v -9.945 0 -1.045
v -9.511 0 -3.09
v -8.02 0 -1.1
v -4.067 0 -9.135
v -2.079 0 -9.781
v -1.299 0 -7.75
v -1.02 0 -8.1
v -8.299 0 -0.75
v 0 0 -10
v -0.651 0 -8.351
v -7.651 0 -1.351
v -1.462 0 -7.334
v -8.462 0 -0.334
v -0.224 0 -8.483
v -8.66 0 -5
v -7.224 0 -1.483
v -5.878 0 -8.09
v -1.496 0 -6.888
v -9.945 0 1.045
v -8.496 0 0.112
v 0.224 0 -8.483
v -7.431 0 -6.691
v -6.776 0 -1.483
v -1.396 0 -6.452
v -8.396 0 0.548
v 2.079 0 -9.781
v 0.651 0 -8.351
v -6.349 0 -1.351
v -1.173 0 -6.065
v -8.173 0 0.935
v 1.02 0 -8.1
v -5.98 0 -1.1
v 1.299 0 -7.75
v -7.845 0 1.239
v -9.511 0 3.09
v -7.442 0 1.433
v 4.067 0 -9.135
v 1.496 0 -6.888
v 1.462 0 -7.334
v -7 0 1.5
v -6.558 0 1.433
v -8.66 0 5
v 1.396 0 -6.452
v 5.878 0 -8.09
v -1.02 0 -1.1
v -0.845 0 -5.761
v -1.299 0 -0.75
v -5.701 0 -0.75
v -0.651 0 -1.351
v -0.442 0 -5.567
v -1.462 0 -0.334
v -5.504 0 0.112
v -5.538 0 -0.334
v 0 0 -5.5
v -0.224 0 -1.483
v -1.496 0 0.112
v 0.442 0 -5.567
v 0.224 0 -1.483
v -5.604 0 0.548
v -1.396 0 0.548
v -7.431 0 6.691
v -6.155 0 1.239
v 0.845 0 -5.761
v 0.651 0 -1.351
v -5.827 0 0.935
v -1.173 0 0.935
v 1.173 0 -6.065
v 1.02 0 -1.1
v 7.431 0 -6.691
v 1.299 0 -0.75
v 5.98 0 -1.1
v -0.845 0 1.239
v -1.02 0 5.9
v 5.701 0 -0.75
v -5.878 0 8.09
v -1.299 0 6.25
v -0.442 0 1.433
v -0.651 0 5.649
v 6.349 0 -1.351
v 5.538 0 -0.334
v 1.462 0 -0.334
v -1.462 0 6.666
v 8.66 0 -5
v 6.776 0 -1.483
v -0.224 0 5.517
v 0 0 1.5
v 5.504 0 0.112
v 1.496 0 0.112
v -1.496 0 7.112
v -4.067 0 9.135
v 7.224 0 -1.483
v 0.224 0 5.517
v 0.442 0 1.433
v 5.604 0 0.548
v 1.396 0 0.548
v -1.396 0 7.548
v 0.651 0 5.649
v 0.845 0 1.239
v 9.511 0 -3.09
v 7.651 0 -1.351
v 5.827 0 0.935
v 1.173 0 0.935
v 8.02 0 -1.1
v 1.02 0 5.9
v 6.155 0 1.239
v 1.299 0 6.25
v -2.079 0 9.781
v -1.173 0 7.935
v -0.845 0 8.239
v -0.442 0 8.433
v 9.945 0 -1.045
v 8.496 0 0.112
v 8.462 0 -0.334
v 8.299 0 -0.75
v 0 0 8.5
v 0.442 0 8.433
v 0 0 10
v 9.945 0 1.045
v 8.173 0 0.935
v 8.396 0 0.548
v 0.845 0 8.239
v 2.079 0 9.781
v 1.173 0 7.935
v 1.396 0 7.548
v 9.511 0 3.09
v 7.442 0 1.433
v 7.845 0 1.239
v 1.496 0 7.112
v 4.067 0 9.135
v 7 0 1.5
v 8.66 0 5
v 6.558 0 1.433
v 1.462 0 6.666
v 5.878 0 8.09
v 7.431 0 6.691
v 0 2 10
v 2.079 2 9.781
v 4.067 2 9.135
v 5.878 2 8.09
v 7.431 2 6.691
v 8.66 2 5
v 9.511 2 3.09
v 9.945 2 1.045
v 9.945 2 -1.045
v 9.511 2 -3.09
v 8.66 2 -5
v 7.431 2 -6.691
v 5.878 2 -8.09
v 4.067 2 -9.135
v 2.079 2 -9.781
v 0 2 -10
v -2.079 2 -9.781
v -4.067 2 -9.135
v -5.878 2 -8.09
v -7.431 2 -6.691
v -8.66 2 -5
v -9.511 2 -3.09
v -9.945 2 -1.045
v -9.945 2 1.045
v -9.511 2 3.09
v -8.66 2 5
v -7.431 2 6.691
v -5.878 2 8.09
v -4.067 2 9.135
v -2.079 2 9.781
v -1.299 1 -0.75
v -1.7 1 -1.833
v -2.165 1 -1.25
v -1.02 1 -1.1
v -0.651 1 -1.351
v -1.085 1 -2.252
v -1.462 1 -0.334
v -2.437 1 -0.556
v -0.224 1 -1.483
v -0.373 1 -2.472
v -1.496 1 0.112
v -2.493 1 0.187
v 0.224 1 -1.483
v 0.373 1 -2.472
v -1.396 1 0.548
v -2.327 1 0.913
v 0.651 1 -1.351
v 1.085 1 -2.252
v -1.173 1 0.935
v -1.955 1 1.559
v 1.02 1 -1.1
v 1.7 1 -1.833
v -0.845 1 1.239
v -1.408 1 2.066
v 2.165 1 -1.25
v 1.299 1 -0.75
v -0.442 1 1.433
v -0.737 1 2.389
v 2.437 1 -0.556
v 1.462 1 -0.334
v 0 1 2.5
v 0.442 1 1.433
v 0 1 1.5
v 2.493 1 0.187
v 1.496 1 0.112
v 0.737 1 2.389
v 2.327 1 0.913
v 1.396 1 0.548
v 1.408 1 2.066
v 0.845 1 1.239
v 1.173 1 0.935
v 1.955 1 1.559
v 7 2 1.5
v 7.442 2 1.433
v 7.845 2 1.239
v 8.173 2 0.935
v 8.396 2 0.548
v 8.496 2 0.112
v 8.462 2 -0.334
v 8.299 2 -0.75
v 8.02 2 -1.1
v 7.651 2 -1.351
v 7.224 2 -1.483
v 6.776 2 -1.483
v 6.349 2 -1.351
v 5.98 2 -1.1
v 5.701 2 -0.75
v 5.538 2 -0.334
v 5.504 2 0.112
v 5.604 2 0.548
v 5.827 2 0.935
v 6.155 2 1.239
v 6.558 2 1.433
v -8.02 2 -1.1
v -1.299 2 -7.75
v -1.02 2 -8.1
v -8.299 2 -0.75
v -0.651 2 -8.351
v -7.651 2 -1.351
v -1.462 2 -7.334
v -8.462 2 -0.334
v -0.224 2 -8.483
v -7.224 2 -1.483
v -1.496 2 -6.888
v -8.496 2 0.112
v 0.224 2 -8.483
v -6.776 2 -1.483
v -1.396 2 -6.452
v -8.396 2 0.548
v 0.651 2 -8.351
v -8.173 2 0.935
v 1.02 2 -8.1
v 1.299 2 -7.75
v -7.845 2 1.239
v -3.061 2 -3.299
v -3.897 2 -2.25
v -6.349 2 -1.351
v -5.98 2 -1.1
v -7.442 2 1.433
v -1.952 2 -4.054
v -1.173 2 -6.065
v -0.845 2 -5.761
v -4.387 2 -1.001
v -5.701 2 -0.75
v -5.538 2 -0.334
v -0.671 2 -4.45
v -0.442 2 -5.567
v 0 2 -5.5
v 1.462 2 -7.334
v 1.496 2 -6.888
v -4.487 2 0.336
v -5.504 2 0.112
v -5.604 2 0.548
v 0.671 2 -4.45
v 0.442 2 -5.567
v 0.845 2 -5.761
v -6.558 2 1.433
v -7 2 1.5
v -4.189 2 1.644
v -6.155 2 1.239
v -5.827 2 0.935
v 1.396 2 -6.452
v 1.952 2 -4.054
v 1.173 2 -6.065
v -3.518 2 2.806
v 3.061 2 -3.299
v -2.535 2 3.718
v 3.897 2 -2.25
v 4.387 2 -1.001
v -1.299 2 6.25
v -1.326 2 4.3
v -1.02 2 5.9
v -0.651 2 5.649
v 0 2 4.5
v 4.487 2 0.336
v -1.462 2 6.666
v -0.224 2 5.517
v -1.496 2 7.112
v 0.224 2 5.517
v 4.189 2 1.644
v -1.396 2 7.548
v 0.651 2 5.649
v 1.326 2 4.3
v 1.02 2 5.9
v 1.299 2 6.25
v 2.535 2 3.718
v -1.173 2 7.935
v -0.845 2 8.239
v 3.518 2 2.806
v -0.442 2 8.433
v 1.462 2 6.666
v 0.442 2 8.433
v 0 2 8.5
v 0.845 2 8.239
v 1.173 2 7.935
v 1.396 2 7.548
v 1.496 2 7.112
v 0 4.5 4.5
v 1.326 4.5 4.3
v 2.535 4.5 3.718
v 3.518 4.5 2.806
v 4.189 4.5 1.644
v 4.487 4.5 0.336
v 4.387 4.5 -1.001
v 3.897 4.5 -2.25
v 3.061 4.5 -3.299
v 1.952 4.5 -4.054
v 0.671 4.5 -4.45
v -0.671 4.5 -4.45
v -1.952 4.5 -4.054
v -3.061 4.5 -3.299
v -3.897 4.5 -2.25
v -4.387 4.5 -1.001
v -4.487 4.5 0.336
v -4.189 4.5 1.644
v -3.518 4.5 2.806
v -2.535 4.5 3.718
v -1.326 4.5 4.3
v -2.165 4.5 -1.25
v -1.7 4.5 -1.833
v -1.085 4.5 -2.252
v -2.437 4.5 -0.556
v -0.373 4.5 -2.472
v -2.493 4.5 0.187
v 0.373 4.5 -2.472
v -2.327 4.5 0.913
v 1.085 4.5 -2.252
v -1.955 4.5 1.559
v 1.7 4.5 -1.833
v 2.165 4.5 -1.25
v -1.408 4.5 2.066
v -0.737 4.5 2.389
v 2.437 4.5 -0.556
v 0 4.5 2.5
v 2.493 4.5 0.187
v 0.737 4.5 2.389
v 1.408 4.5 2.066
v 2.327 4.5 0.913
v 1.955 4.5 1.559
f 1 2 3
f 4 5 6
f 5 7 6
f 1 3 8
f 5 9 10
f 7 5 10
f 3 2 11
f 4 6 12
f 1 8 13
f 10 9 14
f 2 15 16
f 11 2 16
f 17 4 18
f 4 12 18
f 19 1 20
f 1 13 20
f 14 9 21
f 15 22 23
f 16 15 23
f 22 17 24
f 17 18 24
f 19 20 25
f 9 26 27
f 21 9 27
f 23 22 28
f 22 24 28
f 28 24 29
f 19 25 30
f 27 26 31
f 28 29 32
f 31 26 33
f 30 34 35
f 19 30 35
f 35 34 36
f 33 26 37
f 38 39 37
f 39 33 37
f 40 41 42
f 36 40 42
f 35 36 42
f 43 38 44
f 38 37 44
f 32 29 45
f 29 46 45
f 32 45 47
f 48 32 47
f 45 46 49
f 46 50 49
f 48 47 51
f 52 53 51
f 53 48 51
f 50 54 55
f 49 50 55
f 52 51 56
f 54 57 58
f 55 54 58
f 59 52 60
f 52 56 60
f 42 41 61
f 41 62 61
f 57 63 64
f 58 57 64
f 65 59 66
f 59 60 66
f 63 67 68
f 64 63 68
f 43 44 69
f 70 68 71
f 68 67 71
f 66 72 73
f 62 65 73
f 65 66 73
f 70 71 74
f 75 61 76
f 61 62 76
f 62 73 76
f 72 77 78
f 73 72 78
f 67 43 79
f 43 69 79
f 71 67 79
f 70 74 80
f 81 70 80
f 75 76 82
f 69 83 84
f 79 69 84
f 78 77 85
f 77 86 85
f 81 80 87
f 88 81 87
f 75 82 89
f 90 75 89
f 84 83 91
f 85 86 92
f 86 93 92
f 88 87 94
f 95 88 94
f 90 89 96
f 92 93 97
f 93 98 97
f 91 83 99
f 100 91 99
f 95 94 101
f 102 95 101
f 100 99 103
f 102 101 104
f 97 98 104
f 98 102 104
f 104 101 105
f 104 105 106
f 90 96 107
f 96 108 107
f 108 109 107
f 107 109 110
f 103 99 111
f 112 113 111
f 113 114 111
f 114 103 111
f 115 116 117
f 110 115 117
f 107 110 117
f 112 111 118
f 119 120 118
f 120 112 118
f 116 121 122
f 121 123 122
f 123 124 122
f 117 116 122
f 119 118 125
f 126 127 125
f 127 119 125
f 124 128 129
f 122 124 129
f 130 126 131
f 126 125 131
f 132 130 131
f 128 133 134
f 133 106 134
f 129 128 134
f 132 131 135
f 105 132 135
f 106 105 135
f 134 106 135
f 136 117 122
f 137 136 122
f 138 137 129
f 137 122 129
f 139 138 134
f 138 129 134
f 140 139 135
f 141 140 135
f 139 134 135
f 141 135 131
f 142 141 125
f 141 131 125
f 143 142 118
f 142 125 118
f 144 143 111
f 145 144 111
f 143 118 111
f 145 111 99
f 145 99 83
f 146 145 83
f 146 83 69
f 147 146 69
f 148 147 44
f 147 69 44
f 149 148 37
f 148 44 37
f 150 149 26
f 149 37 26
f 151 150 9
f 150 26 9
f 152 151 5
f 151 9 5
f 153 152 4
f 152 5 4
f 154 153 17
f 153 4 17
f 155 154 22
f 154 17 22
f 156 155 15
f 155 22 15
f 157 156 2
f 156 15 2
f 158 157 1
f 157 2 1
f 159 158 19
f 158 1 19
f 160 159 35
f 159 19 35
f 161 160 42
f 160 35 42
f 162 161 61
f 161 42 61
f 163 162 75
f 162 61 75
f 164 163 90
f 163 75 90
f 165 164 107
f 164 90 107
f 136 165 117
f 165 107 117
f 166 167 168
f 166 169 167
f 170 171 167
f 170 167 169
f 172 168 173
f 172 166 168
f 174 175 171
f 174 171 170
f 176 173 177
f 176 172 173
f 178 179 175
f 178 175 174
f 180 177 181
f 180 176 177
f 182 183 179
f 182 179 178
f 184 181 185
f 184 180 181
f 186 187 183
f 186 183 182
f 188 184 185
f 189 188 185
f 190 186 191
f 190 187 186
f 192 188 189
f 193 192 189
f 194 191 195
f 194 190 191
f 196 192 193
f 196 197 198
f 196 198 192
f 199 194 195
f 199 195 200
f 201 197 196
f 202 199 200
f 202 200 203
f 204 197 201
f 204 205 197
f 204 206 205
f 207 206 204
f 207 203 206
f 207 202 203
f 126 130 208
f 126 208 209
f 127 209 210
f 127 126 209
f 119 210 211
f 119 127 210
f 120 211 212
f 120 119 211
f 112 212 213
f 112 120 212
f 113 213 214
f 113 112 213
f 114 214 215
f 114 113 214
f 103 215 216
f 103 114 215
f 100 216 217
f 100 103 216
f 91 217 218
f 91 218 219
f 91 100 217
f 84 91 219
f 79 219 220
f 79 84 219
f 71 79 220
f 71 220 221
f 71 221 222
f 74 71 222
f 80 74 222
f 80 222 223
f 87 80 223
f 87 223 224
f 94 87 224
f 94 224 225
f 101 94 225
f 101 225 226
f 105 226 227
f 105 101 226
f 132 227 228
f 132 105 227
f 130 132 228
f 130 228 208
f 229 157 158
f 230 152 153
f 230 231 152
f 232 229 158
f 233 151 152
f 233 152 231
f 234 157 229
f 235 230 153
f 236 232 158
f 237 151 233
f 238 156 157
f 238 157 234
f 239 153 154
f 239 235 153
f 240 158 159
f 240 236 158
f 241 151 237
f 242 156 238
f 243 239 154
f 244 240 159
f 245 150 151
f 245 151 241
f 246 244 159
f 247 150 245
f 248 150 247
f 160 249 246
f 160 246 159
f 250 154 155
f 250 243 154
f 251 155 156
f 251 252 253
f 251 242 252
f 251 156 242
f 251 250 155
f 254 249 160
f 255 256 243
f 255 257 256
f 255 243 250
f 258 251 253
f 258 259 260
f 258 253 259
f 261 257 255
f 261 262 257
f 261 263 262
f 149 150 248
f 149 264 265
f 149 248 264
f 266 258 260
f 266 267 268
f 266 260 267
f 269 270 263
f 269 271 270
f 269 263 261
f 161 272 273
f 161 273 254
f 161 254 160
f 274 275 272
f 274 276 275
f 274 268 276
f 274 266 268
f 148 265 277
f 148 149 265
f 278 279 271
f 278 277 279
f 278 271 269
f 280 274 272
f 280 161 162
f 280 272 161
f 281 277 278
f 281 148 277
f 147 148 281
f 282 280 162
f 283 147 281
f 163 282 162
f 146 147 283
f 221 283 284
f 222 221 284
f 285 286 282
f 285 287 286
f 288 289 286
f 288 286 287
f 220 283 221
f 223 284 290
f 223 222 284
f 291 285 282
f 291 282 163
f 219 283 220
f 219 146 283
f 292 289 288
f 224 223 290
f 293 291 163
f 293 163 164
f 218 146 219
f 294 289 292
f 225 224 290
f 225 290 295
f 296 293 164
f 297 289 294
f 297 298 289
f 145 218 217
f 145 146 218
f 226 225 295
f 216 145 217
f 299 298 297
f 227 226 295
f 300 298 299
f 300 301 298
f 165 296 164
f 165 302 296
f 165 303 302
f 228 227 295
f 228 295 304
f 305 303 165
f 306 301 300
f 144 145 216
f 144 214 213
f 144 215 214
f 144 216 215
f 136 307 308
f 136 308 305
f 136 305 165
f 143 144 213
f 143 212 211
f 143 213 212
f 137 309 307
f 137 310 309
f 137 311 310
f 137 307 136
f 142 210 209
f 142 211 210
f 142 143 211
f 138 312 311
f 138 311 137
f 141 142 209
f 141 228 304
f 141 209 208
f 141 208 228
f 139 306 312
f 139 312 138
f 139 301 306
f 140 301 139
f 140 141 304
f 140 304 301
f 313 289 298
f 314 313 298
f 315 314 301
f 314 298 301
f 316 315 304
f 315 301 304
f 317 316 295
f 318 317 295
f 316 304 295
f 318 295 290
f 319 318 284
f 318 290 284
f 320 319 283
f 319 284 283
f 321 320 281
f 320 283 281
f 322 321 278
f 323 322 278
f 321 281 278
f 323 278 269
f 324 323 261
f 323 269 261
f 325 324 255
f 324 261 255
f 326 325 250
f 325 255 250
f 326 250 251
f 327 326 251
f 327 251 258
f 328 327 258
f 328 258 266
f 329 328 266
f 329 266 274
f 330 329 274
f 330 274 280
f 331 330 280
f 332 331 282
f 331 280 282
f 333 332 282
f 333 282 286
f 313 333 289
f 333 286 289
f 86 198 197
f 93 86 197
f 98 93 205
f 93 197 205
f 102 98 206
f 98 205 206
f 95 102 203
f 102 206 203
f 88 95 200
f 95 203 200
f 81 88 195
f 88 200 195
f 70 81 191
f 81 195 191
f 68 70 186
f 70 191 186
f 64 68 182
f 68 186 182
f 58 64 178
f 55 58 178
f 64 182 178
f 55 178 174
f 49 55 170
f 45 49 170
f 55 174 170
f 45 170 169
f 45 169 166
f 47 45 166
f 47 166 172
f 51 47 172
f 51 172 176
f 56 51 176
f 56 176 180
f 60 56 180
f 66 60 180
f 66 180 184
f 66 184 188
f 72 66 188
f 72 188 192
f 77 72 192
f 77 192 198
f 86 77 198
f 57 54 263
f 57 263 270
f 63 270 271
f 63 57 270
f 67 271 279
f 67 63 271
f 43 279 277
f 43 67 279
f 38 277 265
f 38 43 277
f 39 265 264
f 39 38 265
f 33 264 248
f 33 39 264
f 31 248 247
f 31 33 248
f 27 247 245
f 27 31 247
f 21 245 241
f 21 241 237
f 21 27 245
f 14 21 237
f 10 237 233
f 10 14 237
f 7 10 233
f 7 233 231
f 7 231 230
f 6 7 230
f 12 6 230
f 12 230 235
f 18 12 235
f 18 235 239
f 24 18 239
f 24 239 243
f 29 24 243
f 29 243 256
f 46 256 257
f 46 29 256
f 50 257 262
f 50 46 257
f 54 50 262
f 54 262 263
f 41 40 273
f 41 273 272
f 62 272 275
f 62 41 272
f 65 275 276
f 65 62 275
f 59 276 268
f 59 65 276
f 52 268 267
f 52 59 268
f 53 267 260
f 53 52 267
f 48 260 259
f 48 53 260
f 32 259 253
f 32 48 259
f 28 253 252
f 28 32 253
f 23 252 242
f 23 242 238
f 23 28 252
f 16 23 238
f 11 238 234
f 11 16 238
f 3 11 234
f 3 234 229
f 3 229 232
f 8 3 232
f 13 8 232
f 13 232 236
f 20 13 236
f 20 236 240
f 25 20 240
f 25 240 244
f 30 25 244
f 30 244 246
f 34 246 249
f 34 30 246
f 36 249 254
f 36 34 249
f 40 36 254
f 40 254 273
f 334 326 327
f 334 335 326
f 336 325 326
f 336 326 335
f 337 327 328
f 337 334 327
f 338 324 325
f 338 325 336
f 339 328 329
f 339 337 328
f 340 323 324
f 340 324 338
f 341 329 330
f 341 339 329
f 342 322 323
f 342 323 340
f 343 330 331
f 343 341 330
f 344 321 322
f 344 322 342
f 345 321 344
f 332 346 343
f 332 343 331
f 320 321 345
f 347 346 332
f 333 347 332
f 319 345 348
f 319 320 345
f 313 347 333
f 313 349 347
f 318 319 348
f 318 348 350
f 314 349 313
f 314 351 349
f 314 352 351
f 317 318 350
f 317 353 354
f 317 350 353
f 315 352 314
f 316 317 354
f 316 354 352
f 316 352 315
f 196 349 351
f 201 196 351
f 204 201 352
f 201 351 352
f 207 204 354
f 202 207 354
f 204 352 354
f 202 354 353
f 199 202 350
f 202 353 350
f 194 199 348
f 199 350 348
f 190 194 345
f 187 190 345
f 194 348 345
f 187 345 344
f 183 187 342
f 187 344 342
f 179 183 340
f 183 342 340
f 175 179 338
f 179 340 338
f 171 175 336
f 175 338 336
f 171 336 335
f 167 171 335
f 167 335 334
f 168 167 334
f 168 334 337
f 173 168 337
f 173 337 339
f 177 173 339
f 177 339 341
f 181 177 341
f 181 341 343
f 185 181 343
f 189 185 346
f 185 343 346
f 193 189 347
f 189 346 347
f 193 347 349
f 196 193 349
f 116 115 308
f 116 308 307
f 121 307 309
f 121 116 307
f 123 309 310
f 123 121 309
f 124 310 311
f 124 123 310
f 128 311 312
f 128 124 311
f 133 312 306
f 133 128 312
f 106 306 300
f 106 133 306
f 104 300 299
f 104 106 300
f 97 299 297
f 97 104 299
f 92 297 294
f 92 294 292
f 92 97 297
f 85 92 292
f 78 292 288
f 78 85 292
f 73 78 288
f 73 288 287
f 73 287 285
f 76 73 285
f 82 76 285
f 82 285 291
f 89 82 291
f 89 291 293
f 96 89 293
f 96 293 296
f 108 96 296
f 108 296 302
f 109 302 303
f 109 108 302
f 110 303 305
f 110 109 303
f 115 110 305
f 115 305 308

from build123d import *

# Parameters (mm, degrees)
SKETCH_1_R          = 10
SKETCH_1_R_2        = 1.5
EXTRUDE_1_DEPTH     = 2
SKETCH_2_R          = 4.5
EXTRUDE_2_DEPTH     = 2.5
SKETCH_3_R          = 1.5
CUT_EXTRUDE_1_DEPTH = 15.84082208
SKETCH_4_R          = 2.5
CUT_EXTRUDE_2_DEPTH = 3.5


with BuildPart() as part:
    # 草图1 → 凸台-拉伸1 (new body)
    with BuildSketch(Plane(origin=(0, 0, 0), x_dir=(1, 0, 0), z_dir=(0, 1, 0))):
        with Locations(Location((0, 0, 0), (0, 0, 270))):
            Circle(SKETCH_1_R)
        with Locations(Location((0, 7, 0), (0, 0, 270))):
            Circle(SKETCH_1_R_2, mode=Mode.SUBTRACT)
        with Locations(Location((7, 0, 0), (0, 0, 270))):
            Circle(SKETCH_1_R_2, mode=Mode.SUBTRACT)
        with Locations(Location((0, -7, 0), (0, 0, 270))):
            Circle(SKETCH_1_R_2, mode=Mode.SUBTRACT)
        with Locations(Location((-7, 0, 0), (0, 0, 270))):
            Circle(SKETCH_1_R_2, mode=Mode.SUBTRACT)
    extrude(amount=EXTRUDE_1_DEPTH)

    # 草图2 → 凸台-拉伸2 (add)
    with BuildSketch(Plane(origin=(0, 2, 0), x_dir=(1, 0, 0), z_dir=(0, 1, 0))):
        with Locations(Location((0, 0, 0), (0, 0, 270))):
            Circle(SKETCH_2_R)
    extrude(amount=EXTRUDE_2_DEPTH)

    # 草图3 → 切除-拉伸1 (cut, through all)
    with BuildSketch(Plane(origin=(0, 4.5, 0), x_dir=(1, 0, 0), z_dir=(0, 1, 0))):
        with Locations(Location((0, 0, 0), (0, 0, 270))):
            Circle(SKETCH_3_R)
    extrude(amount=-CUT_EXTRUDE_1_DEPTH, mode=Mode.SUBTRACT)

    # 草图4 → 切除-拉伸2 (cut)
    with BuildSketch(Plane(origin=(0, 4.5, 0), x_dir=(1, 0, 0), z_dir=(0, 1, 0))):
        with Locations(Location((0, 0, 0), (0, 0, 270))):
            Circle(SKETCH_4_R)
    extrude(amount=-CUT_EXTRUDE_2_DEPTH, mode=Mode.SUBTRACT)


solid = part.part
